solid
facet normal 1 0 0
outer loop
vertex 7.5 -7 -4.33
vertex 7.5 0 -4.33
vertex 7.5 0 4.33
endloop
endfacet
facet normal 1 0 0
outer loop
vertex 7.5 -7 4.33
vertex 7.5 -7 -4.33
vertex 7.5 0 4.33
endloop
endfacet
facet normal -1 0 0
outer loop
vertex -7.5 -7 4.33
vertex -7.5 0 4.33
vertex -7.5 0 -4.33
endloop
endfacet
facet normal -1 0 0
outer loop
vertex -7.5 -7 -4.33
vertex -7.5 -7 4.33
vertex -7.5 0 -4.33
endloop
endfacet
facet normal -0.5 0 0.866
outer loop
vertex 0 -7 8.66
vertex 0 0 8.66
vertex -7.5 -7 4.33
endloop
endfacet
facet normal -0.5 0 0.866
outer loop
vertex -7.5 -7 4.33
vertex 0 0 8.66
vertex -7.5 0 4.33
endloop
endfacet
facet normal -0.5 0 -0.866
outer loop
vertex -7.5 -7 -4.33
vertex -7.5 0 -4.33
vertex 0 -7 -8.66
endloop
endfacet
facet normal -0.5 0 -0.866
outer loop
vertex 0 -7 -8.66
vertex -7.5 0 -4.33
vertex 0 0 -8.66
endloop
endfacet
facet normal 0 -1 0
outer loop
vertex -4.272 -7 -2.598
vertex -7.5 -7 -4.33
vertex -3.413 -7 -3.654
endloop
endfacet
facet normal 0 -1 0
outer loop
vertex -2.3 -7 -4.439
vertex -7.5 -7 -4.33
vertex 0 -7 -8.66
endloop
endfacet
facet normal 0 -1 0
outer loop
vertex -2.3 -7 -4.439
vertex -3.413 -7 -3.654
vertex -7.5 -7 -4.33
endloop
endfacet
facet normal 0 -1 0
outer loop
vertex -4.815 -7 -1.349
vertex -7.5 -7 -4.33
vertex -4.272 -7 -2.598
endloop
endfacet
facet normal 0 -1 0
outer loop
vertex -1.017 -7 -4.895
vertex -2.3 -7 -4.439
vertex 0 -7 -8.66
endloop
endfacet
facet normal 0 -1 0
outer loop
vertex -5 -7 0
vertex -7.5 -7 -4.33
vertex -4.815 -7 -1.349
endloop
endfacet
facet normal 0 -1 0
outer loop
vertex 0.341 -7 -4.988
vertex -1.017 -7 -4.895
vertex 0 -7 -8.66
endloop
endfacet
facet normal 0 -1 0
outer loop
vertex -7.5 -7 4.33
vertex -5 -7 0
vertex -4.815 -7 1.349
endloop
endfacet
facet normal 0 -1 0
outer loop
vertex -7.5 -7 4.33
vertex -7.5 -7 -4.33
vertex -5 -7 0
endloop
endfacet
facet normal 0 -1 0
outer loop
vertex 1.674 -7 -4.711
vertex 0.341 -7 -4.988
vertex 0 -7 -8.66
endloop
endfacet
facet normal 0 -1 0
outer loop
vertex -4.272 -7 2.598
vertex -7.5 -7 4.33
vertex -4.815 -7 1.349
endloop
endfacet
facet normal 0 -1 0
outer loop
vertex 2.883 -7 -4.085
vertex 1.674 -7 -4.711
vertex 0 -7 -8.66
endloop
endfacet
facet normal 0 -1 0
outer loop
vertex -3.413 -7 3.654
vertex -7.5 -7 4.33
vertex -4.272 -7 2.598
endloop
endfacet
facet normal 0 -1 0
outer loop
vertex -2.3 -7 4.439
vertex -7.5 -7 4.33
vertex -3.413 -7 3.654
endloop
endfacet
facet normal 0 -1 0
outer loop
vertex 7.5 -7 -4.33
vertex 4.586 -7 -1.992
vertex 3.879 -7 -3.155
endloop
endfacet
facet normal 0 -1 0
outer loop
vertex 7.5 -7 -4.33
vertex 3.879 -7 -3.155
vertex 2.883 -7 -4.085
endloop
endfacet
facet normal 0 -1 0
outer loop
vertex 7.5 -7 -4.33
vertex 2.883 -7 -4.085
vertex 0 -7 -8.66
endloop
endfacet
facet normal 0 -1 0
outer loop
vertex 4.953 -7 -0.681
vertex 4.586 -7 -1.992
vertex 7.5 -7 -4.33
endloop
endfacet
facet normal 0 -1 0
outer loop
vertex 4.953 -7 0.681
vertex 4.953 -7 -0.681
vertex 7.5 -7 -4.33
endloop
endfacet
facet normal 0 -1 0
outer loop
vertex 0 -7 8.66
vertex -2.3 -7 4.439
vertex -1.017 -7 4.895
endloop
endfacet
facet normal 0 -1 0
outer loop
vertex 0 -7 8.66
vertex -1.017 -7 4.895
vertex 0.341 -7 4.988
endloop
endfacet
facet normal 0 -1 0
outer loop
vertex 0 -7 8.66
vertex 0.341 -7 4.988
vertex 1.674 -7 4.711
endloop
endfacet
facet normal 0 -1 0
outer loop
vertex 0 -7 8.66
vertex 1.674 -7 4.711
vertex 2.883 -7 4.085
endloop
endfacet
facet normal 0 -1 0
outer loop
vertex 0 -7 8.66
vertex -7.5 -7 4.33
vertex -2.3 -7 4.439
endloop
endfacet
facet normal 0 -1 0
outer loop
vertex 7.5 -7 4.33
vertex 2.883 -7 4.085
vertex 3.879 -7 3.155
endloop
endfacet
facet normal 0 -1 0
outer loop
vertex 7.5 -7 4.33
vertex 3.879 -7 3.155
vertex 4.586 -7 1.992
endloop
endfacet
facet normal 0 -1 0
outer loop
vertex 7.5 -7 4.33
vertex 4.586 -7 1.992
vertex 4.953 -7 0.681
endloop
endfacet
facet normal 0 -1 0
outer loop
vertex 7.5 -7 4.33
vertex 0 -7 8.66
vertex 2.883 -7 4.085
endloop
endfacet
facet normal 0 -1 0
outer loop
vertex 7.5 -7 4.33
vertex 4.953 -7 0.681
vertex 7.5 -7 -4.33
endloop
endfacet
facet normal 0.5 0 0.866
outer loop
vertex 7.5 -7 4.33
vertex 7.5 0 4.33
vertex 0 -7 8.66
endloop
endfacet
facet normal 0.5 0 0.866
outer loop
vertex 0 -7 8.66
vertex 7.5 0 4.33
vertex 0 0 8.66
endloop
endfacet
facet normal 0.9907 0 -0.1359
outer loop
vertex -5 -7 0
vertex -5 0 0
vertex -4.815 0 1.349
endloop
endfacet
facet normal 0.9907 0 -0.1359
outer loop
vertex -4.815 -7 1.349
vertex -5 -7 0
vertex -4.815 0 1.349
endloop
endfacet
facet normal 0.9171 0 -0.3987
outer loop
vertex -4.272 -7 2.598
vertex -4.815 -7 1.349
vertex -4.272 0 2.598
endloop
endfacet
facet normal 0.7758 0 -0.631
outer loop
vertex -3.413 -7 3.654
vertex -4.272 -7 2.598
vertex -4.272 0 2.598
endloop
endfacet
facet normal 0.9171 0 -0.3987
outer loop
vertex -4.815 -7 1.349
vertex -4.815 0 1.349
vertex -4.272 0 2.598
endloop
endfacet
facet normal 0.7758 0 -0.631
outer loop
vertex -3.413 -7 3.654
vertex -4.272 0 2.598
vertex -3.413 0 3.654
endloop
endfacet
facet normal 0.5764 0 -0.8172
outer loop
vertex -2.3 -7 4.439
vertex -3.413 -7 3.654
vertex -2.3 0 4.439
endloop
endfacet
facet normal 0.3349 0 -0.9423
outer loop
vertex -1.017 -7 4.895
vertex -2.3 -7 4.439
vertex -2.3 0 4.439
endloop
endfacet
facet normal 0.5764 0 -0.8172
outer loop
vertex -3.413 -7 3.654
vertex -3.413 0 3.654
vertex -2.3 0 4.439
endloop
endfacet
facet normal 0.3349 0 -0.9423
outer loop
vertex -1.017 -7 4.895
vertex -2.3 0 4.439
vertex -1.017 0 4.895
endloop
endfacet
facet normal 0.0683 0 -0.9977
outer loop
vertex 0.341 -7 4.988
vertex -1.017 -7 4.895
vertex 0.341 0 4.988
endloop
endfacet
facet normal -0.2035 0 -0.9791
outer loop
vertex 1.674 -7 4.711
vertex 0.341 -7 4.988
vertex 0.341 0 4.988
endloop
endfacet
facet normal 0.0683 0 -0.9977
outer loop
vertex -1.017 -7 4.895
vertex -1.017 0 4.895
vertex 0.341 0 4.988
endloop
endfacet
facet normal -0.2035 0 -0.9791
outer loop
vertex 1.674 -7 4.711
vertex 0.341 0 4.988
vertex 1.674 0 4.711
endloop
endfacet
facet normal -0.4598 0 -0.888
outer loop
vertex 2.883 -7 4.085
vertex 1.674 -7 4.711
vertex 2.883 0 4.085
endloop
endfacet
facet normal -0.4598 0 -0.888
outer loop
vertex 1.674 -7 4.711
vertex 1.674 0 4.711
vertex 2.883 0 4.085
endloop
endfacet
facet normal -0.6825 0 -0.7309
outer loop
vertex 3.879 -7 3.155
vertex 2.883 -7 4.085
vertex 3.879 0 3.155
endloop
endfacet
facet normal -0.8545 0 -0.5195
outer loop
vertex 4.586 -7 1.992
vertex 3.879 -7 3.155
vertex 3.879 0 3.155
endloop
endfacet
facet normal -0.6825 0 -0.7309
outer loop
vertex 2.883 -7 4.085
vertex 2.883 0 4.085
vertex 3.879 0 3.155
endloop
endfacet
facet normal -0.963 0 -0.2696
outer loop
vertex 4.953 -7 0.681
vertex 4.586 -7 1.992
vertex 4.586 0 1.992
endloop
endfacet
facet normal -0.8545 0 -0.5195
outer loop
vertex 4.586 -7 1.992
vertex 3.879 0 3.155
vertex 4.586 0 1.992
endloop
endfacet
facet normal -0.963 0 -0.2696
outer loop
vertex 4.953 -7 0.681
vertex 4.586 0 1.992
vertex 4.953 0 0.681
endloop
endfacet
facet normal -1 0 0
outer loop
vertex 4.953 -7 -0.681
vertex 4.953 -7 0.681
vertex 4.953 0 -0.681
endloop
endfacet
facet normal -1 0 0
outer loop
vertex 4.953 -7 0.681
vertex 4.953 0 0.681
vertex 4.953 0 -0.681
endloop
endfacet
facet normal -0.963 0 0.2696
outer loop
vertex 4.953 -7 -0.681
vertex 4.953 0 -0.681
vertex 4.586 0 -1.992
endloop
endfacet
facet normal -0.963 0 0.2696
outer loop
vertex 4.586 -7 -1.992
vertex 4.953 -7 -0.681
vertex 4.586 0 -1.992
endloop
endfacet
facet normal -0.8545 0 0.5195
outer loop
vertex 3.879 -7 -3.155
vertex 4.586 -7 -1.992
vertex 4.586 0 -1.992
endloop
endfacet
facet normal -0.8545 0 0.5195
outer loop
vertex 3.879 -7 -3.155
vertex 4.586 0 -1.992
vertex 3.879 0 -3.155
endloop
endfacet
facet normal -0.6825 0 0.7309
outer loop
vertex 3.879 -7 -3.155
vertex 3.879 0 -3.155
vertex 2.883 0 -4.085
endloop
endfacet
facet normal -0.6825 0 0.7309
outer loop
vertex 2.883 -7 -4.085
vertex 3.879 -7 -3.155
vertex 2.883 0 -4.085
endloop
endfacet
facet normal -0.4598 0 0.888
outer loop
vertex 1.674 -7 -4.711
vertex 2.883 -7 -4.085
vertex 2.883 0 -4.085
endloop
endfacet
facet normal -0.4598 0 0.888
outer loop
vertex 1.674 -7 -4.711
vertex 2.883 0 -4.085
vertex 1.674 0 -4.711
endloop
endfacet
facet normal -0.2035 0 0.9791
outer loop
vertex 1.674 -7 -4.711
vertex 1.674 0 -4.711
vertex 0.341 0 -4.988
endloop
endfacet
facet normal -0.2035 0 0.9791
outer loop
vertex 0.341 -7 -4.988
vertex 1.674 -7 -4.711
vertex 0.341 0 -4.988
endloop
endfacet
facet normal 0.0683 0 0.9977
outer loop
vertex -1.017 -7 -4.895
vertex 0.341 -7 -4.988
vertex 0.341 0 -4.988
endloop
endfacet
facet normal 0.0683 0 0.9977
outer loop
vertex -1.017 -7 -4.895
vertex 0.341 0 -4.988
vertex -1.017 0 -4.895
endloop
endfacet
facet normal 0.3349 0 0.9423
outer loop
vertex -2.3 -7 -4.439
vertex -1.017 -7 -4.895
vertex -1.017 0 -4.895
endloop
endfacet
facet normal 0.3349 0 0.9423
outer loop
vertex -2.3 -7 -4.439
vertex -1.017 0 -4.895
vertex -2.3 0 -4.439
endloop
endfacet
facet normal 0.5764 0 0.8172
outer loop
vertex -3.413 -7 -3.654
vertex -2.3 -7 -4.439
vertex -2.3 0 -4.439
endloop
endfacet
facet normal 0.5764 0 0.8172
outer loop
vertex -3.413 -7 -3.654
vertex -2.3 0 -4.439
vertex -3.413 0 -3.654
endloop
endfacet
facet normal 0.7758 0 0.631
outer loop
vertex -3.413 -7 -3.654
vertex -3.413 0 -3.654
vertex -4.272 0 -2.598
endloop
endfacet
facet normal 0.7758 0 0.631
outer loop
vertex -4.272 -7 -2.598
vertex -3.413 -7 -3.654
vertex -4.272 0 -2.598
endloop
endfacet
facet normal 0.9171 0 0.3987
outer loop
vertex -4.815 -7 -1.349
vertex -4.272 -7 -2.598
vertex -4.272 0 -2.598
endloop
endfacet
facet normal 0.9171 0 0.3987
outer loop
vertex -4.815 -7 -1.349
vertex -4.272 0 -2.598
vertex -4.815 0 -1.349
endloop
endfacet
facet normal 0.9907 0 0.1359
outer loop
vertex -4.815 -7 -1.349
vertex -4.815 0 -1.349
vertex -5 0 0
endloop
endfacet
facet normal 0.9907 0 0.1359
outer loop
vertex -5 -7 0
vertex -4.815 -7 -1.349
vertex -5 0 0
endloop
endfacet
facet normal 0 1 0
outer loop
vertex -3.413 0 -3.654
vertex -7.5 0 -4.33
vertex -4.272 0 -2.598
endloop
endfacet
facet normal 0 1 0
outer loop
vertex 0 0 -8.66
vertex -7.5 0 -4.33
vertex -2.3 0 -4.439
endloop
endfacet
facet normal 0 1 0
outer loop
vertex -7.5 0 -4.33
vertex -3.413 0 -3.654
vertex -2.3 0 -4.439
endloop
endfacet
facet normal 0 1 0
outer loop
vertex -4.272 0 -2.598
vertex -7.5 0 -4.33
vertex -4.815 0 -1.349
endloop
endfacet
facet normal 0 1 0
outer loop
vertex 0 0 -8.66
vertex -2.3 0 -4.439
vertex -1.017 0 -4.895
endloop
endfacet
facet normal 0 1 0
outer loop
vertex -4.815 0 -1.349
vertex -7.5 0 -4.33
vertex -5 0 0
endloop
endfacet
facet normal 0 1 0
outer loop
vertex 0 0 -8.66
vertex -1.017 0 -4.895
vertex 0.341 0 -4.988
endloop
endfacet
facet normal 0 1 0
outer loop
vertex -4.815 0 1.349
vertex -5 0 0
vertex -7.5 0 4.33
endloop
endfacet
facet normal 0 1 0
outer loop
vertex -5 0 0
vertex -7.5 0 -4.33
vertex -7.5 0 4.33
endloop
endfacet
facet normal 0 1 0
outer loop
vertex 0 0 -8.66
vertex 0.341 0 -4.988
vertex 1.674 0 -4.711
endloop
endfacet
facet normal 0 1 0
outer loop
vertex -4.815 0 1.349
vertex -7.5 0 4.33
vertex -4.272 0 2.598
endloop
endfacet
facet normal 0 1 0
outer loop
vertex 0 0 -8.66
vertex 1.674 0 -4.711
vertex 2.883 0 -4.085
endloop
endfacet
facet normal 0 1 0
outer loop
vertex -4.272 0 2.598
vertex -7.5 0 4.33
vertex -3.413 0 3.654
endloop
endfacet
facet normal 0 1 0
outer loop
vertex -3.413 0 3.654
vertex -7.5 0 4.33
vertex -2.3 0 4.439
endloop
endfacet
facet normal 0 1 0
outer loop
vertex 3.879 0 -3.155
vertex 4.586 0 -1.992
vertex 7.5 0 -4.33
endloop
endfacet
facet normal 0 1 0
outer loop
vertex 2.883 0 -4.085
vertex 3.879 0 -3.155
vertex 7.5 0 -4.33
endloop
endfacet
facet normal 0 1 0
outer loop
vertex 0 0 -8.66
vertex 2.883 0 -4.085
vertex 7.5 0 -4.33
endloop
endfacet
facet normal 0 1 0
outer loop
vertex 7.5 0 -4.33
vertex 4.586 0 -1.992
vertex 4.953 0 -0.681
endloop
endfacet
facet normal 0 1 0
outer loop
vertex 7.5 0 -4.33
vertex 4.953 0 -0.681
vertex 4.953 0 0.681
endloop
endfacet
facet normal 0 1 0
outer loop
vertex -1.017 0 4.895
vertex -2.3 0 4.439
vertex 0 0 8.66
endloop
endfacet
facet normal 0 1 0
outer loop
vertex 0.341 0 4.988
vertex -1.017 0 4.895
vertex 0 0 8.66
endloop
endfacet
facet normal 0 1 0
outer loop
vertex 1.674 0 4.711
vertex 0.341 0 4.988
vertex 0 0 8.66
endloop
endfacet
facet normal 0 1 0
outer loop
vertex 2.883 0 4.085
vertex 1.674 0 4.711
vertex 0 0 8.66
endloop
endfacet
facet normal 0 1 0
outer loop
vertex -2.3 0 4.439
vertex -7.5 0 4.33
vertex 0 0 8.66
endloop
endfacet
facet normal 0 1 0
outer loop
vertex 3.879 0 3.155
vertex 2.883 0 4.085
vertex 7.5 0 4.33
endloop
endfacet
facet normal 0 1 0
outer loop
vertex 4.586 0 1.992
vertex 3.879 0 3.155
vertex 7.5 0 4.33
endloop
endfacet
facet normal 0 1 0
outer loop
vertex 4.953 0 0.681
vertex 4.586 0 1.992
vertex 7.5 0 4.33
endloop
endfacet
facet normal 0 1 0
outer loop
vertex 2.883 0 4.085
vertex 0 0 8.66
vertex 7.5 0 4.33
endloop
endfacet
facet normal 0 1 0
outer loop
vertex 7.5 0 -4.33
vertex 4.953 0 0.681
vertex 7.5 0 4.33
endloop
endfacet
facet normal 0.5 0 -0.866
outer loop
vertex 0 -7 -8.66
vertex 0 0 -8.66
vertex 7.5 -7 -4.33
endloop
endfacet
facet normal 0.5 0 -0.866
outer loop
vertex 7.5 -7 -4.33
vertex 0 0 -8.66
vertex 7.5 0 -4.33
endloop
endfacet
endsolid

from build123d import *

# Parameters (mm, degrees)
F1_DEPTH = 7
F3_D     = 10


with BuildPart() as f1:
    # F0 (on Front) → F1 (new body)
    with BuildSketch(Plane.XZ):
        Polygon((7.5, -4.330127), (7.5, 4.330127), (0, 8.660254), (-7.5, 4.330127), (-7.5, -4.330127), (0, -8.660254), align=None)
    extrude(amount=F1_DEPTH)

    # F3 (through all)
    with Locations(Plane.XZ.offset(7)):
        with Locations((0, 0)):
            Hole(F3_D / 2)


solid = f1.part
